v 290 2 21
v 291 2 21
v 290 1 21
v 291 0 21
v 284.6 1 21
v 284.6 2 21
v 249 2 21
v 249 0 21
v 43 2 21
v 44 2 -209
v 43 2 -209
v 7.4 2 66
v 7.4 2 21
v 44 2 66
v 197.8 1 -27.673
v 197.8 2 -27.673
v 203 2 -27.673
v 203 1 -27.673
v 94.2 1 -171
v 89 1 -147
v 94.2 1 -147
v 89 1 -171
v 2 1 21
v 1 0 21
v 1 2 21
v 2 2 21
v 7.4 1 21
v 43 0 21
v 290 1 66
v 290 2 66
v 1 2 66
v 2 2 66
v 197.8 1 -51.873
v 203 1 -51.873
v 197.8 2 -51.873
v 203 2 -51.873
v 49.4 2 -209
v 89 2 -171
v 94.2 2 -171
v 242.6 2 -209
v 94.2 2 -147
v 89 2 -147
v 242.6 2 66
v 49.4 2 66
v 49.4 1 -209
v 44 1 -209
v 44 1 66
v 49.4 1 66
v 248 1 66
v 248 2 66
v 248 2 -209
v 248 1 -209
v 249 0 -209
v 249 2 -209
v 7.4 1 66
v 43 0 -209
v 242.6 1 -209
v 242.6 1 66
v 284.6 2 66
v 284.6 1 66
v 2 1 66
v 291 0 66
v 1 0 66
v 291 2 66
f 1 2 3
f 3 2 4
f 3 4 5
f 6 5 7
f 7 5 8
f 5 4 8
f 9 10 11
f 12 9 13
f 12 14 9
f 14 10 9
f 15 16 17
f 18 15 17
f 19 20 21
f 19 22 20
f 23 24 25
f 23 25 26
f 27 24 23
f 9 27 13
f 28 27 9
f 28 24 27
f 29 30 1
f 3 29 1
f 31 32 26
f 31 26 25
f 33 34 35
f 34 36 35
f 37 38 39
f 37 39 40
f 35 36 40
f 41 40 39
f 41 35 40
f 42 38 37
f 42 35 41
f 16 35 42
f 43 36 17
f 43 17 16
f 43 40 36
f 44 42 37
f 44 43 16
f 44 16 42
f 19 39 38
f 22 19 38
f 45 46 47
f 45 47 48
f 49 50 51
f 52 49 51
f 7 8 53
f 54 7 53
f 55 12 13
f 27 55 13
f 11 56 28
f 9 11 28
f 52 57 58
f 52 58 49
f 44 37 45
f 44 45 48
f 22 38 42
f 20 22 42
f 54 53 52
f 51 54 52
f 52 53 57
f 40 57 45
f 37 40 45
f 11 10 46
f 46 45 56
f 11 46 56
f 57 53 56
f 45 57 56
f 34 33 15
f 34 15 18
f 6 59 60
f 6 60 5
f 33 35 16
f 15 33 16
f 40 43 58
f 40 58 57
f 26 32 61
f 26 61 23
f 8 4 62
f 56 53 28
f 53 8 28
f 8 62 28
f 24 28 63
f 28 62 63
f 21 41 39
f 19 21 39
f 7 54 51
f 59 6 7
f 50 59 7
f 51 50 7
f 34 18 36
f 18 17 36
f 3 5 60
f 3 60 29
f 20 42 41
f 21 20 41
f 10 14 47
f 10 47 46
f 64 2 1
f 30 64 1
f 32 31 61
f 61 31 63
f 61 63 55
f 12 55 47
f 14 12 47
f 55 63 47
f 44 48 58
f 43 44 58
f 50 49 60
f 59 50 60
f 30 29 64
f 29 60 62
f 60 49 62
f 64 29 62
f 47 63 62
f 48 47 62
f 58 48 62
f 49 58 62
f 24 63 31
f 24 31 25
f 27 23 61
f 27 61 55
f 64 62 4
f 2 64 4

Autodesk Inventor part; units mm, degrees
ref_plane "YZ Plane" through (0, 0, 0) normal (1, 0, 0) x (0, 1, 0)
ref_plane "XZ Plane" through (0, 0, 0) normal (0, 1, 0) x (-1, 0, 0)
ref_plane "XY Plane" through (0, 0, 0) normal (0, 0, 1) x (1, 0, 0)
sketch "스케치1" plane through (0, 0, 0) normal (0, 1, 0) x (-1, 0, 0)
  line L0 (-43, 66) -> (-249, 66)
  line L1 (-249, 66) -> (-249, -209)
  line L2 (-249, -209) -> (-43, -209)
  line L3 (-43, -209) -> (-43, 66)
  point P0 (0, 0)
  dimension "d0" = 206
  dimension "d1" = 275
extrude "돌출1" add sketch "스케치1" along normal blind 2
sketch "스케치2" plane through (0, 2, 0) normal (0, 1, 0) x (1, 0, 0)
  line L0 (43, -66) -> (249, -66) projected
  line L1 (249, -66) -> (248, -66)
  line L2 (248, -66) -> (248, 209)
  line L3 (249, 209) -> (43, 209) projected
  line L4 (43, 209) -> (43, -66) projected
  line L5 (43, -66) -> (44, -66)
  line L6 (44, -66) -> (44, 209)
  line L7 (44, 209) -> (49.4, 209)
  line L8 (49.4, 209) -> (49.4, -66)
  line L9 (248, -66) -> (242.6, -66)
  line L10 (242.6, -66) -> (242.6, 209)
  line L11 (49.4, -66) -> (44, -66)
  line L12 (49.4, 209) -> (44, 209)
  point P0 (0, 0)
  dimension "d4" = 1
  dimension "d5" = 5.4
  dimension "d6" = 5.4
  dimension "d9" = 1
extrude "돌출2" cut sketch "스케치2" against normal blind 1 contours L6 L3 L8 L0 | L10 L3 L2 L0
sketch "스케치3" plane through (0, 2, 0) normal (0, 1, 0) x (1, 0, 0)
  line L0 (197.8, 27.6733) -> (203, 27.6733)
  line L1 (203, 27.6733) -> (203, 51.8733)
  line L2 (203, 51.8733) -> (197.8, 51.8733)
  line L3 (197.8, 51.8733) -> (197.8, 27.6733)
  point P0 (0, 0)
  dimension "d10" = 5.2
  dimension "d11" = 24.2
extrude "돌출3" cut sketch "스케치3" against normal blind 1
sketch "스케치4" plane through (0, 2, 0) normal (0, 1, 0) x (1, 0, 0)
  line L0 (94.2, 171) -> (89, 171)
  line L1 (89, 171) -> (89, 147)
  line L2 (89, 147) -> (94.2, 147)
  line L3 (94.2, 147) -> (94.2, 171)
  point P0 (0, 0)
  dimension "d14" = 5.2
extrude "돌출4" cut sketch "스케치4" against normal blind 1
sketch "스케치5" plane through (0, 0, 0) normal (0, -1, 0) x (1, 0, 0)
  line L0 (43, -209) -> (43, 66) projected
  line L1 (43, 66) -> (1, 66)
  line L2 (1, 66) -> (1, 21)
  line L3 (1, 21) -> (43, 21)
  line L4 (249, 66) -> (291, 66)
  line L5 (291, 66) -> (291, 21)
  line L6 (291, 21) -> (249, 21)
  line L7 (249, 66) -> (249, -209) projected
  point P0 (0, 0)
  dimension "d17" = 42
  dimension "d18" = 45
  dimension "d19" = 42
  dimension "d20" = 45
extrude "돌출5" add sketch "스케치5" against normal blind 2
sketch "스케치6" plane through (0, 2, 0) normal (0, 1, 0) x (1, 0, 0)
  line L0 (44, -66) -> (44, 209) projected
  line L1 (44, 209) -> (43, 209) projected
  line L2 (43, 209) -> (43, -21) projected
  line L3 (43, -21) -> (1, -21) projected
  line L4 (1, -21) -> (1, -66) projected
  line L5 (1, -66) -> (44, -66) projected
  line L6 (248, 209) -> (248, -66) projected
  line L7 (248, -66) -> (291, -66) projected
  line L8 (291, -66) -> (291, -21) projected
  line L9 (291, -21) -> (249, -21) projected
  line L10 (249, -21) -> (249, 209) projected
  line L11 (249, 209) -> (248, 209) projected
  line L12 (2, -66) -> (2, -21)
  line L13 (1, -66) -> (291, -66) projected
  line L14 (7.4, -66) -> (7.4, -21)
  line L15 (248, -66) -> (291, -66) projected
  line L16 (290, -66) -> (290, -21)
  line L17 (284.6, -66) -> (284.6, -21)
  line L18 (291, -21) -> (249, -21) projected
  point P0 (0, 0)
  dimension "d23" = 5.4
  dimension "d24" = 1
  dimension "d25" = 1
  dimension "d26" = 5.4
extrude "돌출6" cut sketch "스케치6" against normal blind 1 contours L5 L12 L3 L14 | L17 L9 L16 L7
properties part number "밑판" material "알루미늄 6061"
